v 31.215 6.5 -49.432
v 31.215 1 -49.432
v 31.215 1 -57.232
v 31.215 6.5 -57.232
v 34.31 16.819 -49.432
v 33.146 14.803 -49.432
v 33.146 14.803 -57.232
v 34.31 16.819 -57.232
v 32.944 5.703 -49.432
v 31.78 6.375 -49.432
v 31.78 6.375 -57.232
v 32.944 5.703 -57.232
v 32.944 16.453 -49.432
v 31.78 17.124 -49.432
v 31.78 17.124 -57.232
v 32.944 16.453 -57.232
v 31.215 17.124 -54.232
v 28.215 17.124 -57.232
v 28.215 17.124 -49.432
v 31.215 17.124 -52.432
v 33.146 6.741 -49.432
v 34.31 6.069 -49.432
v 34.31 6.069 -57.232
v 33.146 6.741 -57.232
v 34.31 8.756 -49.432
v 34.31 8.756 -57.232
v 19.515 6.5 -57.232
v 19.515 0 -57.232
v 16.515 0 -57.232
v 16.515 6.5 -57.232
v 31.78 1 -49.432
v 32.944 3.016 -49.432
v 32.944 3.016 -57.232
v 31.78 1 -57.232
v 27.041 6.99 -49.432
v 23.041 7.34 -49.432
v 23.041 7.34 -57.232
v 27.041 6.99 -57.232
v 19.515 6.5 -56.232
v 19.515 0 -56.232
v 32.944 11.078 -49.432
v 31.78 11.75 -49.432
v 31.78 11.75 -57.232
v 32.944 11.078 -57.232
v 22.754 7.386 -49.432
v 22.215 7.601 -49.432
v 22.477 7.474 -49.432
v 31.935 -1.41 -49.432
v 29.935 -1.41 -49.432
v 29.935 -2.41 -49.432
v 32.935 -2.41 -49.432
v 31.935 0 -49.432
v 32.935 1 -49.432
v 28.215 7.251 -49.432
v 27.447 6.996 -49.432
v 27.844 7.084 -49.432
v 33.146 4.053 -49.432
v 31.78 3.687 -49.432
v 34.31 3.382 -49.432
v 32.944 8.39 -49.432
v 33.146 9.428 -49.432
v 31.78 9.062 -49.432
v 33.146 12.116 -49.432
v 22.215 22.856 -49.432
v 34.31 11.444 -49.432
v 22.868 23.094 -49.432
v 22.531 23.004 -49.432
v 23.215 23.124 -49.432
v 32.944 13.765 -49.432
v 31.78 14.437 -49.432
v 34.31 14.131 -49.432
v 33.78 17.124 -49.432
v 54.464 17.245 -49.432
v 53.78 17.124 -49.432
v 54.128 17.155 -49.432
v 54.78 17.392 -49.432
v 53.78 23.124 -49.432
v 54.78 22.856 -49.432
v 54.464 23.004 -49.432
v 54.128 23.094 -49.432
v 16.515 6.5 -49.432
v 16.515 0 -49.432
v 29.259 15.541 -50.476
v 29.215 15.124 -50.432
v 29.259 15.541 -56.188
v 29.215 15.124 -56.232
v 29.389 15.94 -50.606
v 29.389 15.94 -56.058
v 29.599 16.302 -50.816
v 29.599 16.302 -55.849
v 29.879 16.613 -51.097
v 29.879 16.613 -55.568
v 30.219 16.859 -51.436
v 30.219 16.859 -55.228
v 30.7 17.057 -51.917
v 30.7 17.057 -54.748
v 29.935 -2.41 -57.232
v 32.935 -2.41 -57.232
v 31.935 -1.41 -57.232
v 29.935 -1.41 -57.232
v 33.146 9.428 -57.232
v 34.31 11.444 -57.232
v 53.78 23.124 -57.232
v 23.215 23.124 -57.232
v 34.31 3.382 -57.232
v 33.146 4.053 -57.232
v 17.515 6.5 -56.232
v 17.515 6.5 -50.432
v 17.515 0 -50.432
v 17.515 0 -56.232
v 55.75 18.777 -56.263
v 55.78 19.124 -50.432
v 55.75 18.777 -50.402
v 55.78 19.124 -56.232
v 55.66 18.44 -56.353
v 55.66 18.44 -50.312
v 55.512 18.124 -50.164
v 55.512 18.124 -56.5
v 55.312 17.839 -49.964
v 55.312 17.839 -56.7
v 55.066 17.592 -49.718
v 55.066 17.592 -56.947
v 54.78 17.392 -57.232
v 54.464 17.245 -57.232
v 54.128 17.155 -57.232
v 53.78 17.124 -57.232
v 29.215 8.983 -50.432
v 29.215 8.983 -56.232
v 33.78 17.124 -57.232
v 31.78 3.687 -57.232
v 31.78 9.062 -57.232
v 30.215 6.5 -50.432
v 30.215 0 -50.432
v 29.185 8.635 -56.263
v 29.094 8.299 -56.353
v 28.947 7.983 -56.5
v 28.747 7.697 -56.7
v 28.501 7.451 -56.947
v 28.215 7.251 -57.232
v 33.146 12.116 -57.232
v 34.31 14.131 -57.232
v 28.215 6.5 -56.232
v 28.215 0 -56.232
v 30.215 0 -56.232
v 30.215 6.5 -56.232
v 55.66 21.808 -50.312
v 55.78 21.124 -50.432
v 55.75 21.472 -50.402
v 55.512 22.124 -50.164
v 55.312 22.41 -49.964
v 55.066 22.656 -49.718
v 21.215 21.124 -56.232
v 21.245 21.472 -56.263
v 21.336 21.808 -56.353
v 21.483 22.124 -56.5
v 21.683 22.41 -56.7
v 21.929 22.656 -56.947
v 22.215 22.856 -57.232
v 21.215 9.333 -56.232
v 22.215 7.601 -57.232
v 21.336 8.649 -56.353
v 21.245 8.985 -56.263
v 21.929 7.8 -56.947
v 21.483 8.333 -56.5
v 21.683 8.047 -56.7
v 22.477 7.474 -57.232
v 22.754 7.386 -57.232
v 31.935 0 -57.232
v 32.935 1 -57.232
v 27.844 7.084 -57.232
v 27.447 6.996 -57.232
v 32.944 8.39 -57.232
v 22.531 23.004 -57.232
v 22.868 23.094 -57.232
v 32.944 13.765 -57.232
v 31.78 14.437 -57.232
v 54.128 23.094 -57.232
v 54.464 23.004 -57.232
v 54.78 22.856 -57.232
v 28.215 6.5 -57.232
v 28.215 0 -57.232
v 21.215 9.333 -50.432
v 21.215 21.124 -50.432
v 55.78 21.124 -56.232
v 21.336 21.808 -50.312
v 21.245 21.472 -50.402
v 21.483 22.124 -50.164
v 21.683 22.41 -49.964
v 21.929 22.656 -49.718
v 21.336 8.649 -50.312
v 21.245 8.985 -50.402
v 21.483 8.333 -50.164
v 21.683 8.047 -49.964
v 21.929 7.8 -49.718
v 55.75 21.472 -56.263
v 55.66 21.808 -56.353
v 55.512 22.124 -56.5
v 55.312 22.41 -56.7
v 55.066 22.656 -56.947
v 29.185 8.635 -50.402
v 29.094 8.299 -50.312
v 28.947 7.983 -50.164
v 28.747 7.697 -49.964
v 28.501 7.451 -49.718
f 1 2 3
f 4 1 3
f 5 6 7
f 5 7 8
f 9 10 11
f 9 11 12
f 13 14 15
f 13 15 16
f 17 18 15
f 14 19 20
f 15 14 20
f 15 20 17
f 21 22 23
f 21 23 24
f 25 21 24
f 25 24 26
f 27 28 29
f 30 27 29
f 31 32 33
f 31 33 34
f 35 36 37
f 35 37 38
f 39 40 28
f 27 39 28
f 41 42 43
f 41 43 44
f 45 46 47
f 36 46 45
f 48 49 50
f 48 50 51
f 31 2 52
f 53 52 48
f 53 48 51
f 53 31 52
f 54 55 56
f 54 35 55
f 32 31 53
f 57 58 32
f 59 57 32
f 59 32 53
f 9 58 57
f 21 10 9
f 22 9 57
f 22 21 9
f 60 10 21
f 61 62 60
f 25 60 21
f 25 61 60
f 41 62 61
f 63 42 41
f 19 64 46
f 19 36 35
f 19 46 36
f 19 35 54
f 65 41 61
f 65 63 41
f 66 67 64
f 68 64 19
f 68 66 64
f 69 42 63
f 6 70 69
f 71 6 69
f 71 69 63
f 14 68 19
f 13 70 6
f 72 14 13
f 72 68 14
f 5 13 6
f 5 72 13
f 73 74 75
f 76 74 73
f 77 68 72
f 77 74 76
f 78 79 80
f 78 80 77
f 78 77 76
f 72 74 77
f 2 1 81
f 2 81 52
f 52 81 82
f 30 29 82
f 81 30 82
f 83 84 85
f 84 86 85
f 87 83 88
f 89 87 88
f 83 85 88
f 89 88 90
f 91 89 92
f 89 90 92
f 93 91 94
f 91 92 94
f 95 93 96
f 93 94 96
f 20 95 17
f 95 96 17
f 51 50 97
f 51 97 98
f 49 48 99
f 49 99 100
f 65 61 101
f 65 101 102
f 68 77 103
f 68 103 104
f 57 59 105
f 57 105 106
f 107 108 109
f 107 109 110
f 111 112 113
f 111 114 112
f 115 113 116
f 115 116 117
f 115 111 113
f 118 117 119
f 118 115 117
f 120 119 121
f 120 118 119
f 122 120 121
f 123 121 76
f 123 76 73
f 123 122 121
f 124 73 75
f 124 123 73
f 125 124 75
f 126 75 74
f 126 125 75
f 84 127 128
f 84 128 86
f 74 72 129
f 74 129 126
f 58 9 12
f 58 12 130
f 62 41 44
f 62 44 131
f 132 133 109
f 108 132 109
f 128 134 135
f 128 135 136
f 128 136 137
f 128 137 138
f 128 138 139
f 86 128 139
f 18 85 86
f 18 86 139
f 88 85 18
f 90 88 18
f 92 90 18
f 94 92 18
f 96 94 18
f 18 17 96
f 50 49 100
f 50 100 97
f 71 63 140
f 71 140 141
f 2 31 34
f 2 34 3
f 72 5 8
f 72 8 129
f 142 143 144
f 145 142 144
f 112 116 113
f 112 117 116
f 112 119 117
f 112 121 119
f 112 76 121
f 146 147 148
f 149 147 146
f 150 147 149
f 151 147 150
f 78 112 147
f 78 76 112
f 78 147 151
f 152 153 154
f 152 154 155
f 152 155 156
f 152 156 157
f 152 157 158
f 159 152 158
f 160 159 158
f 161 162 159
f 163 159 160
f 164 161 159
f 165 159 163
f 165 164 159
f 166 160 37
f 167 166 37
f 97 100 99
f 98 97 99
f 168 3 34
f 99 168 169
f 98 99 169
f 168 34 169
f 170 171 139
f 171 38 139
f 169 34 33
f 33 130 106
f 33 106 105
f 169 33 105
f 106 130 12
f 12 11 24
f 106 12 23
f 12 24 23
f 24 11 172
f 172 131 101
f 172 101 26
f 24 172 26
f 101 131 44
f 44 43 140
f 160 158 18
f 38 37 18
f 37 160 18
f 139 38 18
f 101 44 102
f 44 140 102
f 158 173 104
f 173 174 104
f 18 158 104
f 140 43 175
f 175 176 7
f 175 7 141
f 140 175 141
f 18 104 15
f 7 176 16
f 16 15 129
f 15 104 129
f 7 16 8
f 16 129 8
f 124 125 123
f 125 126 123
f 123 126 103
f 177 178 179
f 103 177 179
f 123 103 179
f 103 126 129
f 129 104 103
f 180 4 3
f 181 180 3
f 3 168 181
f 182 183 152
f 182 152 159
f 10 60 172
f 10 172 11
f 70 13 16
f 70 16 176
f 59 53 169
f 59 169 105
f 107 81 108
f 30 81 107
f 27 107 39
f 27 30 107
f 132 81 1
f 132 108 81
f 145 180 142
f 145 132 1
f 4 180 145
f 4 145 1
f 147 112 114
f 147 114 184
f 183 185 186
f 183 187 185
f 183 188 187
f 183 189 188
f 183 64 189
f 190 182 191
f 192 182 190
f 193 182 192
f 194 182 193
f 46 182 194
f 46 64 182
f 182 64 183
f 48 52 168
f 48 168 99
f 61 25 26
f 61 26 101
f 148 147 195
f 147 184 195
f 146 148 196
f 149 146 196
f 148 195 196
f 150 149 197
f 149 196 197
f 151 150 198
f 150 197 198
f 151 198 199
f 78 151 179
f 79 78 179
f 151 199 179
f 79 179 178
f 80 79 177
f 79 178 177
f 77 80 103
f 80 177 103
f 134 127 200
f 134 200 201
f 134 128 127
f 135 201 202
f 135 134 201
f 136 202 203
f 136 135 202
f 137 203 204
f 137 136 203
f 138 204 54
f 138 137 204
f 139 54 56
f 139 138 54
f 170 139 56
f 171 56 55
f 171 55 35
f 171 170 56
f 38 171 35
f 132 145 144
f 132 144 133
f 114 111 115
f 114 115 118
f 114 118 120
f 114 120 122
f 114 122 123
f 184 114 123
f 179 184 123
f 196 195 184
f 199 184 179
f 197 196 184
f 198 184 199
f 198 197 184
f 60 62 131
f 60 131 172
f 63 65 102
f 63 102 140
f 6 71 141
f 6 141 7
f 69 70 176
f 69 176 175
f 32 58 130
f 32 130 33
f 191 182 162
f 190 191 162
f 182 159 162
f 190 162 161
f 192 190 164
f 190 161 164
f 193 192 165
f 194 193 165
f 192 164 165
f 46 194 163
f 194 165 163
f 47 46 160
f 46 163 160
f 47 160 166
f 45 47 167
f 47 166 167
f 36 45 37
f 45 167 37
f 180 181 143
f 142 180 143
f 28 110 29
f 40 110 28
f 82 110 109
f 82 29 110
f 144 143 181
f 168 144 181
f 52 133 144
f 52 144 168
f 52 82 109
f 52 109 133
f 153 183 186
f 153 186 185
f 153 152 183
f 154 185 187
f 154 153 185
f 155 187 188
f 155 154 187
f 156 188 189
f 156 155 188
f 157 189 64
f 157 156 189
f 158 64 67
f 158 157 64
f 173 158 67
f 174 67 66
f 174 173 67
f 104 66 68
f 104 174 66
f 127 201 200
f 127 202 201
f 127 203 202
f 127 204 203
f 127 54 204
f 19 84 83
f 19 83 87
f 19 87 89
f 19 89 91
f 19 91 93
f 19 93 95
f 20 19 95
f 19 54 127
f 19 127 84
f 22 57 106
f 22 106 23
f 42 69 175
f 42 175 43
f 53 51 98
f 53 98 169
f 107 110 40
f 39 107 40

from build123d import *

# Parameters (mm, degrees)
BOSS_EXTRUDE3_DEPTH = 6.5
BOSS_EXTRUDE4_DEPTH = 7.8
CHAMFER1_SIZE       = 1
FILLET1_R           = 2


with BuildPart() as part:
    # Sketch2 → Boss-Extrude3 (new body)
    with BuildSketch(Plane(origin=(0, 0, 0), x_dir=(1, 0, 0), z_dir=(0, 1, 0))):
        Polygon((30.214970749, 56.232123089), (30.214970749, 50.432123089), (17.514970749, 50.432123089), (17.514970749, 56.232123089), (19.514970749, 56.232123089), (19.514970749, 57.232123089), (16.514970749, 57.232123089), (16.514970749, 49.432123089), (31.214970749, 49.432123089), (31.214970749, 57.232123089), (28.214970749, 57.232123089), (28.214970749, 56.232123089), align=None)
    extrude(amount=BOSS_EXTRUDE3_DEPTH)

    # Sketch1 → Boss-Extrude4 (add)
    with BuildSketch(Plane(origin=(-49.432123089, 0, -49.432123089), x_dir=(1, 0, 0), z_dir=(0, 0, 1))):
        Polygon((82.376068434, 3.015544457), (81.2123933, 1), (80.647093838, 1), (80.647093838, 0), (81.367093838, 0), (81.367093838, -1.41), (79.367093838, -1.41), (79.367093838, -2.41), (82.367093838, -2.41), (82.367093838, 1), (83.742093838, 3.38156986), (82.578418703, 4.053418013), (83.742093838, 6.068962469), (82.578418703, 6.740810621), (83.742093838, 8.756355078), (82.578418703, 9.42820323), (83.742093838, 11.443747687), (82.578418703, 12.115595839), (83.742093838, 14.131140296), (82.578418703, 14.802988448), (83.742093838, 16.818532905), (83.2123933, 17.124355653), (105.2123933, 17.124355653), (105.2123933, 23.124355653), (70.647093838, 23.124355653), (70.647093838, 7.499909308), (78.647093838, 6.8), (78.647093838, 17.124355653), (81.2123933, 17.124355653), (82.376068434, 16.452507501), (81.2123933, 14.436963044), (82.376068434, 13.765114892), (81.2123933, 11.749570435), (82.376068434, 11.077722283), (81.2123933, 9.062177826), (82.376068434, 8.390329674), (81.2123933, 6.374785218), (82.376068434, 5.702937065), (81.2123933, 3.687392609), align=None)
    extrude(amount=-BOSS_EXTRUDE4_DEPTH)

    # Chamfer1
    chamfer1_edges = [part.edges().sort_by_distance(p)[0] for p in [
        (29.214970749, 11.962177826, -49.432123089),
        (21.214970749, 15.312132481, -49.432123089),
        (55.780270211, 20.124355653, -49.432123089),
        (29.214970749, 11.962177826, -57.232123089),
        (21.214970749, 15.312132481, -57.232123089),
        (55.780270211, 20.124355653, -57.232123089),
    ]]
    chamfer(chamfer1_edges, length=CHAMFER1_SIZE)

    # Fillet1
    fillet1_edges = [part.edges().sort_by_distance(p)[0] for p in [
        (29.214970749, 6.8, -53.332123089),
        (29.214970749, 17.124355653, -53.332123089),
        (21.214970749, 7.499909308, -53.332123089),
        (21.214970749, 23.124355653, -53.332123089),
        (55.780270211, 17.124355653, -53.332123089),
        (55.780270211, 23.124355653, -53.332123089),
    ]]
    fillet(fillet1_edges, radius=FILLET1_R)


solid = part.part
